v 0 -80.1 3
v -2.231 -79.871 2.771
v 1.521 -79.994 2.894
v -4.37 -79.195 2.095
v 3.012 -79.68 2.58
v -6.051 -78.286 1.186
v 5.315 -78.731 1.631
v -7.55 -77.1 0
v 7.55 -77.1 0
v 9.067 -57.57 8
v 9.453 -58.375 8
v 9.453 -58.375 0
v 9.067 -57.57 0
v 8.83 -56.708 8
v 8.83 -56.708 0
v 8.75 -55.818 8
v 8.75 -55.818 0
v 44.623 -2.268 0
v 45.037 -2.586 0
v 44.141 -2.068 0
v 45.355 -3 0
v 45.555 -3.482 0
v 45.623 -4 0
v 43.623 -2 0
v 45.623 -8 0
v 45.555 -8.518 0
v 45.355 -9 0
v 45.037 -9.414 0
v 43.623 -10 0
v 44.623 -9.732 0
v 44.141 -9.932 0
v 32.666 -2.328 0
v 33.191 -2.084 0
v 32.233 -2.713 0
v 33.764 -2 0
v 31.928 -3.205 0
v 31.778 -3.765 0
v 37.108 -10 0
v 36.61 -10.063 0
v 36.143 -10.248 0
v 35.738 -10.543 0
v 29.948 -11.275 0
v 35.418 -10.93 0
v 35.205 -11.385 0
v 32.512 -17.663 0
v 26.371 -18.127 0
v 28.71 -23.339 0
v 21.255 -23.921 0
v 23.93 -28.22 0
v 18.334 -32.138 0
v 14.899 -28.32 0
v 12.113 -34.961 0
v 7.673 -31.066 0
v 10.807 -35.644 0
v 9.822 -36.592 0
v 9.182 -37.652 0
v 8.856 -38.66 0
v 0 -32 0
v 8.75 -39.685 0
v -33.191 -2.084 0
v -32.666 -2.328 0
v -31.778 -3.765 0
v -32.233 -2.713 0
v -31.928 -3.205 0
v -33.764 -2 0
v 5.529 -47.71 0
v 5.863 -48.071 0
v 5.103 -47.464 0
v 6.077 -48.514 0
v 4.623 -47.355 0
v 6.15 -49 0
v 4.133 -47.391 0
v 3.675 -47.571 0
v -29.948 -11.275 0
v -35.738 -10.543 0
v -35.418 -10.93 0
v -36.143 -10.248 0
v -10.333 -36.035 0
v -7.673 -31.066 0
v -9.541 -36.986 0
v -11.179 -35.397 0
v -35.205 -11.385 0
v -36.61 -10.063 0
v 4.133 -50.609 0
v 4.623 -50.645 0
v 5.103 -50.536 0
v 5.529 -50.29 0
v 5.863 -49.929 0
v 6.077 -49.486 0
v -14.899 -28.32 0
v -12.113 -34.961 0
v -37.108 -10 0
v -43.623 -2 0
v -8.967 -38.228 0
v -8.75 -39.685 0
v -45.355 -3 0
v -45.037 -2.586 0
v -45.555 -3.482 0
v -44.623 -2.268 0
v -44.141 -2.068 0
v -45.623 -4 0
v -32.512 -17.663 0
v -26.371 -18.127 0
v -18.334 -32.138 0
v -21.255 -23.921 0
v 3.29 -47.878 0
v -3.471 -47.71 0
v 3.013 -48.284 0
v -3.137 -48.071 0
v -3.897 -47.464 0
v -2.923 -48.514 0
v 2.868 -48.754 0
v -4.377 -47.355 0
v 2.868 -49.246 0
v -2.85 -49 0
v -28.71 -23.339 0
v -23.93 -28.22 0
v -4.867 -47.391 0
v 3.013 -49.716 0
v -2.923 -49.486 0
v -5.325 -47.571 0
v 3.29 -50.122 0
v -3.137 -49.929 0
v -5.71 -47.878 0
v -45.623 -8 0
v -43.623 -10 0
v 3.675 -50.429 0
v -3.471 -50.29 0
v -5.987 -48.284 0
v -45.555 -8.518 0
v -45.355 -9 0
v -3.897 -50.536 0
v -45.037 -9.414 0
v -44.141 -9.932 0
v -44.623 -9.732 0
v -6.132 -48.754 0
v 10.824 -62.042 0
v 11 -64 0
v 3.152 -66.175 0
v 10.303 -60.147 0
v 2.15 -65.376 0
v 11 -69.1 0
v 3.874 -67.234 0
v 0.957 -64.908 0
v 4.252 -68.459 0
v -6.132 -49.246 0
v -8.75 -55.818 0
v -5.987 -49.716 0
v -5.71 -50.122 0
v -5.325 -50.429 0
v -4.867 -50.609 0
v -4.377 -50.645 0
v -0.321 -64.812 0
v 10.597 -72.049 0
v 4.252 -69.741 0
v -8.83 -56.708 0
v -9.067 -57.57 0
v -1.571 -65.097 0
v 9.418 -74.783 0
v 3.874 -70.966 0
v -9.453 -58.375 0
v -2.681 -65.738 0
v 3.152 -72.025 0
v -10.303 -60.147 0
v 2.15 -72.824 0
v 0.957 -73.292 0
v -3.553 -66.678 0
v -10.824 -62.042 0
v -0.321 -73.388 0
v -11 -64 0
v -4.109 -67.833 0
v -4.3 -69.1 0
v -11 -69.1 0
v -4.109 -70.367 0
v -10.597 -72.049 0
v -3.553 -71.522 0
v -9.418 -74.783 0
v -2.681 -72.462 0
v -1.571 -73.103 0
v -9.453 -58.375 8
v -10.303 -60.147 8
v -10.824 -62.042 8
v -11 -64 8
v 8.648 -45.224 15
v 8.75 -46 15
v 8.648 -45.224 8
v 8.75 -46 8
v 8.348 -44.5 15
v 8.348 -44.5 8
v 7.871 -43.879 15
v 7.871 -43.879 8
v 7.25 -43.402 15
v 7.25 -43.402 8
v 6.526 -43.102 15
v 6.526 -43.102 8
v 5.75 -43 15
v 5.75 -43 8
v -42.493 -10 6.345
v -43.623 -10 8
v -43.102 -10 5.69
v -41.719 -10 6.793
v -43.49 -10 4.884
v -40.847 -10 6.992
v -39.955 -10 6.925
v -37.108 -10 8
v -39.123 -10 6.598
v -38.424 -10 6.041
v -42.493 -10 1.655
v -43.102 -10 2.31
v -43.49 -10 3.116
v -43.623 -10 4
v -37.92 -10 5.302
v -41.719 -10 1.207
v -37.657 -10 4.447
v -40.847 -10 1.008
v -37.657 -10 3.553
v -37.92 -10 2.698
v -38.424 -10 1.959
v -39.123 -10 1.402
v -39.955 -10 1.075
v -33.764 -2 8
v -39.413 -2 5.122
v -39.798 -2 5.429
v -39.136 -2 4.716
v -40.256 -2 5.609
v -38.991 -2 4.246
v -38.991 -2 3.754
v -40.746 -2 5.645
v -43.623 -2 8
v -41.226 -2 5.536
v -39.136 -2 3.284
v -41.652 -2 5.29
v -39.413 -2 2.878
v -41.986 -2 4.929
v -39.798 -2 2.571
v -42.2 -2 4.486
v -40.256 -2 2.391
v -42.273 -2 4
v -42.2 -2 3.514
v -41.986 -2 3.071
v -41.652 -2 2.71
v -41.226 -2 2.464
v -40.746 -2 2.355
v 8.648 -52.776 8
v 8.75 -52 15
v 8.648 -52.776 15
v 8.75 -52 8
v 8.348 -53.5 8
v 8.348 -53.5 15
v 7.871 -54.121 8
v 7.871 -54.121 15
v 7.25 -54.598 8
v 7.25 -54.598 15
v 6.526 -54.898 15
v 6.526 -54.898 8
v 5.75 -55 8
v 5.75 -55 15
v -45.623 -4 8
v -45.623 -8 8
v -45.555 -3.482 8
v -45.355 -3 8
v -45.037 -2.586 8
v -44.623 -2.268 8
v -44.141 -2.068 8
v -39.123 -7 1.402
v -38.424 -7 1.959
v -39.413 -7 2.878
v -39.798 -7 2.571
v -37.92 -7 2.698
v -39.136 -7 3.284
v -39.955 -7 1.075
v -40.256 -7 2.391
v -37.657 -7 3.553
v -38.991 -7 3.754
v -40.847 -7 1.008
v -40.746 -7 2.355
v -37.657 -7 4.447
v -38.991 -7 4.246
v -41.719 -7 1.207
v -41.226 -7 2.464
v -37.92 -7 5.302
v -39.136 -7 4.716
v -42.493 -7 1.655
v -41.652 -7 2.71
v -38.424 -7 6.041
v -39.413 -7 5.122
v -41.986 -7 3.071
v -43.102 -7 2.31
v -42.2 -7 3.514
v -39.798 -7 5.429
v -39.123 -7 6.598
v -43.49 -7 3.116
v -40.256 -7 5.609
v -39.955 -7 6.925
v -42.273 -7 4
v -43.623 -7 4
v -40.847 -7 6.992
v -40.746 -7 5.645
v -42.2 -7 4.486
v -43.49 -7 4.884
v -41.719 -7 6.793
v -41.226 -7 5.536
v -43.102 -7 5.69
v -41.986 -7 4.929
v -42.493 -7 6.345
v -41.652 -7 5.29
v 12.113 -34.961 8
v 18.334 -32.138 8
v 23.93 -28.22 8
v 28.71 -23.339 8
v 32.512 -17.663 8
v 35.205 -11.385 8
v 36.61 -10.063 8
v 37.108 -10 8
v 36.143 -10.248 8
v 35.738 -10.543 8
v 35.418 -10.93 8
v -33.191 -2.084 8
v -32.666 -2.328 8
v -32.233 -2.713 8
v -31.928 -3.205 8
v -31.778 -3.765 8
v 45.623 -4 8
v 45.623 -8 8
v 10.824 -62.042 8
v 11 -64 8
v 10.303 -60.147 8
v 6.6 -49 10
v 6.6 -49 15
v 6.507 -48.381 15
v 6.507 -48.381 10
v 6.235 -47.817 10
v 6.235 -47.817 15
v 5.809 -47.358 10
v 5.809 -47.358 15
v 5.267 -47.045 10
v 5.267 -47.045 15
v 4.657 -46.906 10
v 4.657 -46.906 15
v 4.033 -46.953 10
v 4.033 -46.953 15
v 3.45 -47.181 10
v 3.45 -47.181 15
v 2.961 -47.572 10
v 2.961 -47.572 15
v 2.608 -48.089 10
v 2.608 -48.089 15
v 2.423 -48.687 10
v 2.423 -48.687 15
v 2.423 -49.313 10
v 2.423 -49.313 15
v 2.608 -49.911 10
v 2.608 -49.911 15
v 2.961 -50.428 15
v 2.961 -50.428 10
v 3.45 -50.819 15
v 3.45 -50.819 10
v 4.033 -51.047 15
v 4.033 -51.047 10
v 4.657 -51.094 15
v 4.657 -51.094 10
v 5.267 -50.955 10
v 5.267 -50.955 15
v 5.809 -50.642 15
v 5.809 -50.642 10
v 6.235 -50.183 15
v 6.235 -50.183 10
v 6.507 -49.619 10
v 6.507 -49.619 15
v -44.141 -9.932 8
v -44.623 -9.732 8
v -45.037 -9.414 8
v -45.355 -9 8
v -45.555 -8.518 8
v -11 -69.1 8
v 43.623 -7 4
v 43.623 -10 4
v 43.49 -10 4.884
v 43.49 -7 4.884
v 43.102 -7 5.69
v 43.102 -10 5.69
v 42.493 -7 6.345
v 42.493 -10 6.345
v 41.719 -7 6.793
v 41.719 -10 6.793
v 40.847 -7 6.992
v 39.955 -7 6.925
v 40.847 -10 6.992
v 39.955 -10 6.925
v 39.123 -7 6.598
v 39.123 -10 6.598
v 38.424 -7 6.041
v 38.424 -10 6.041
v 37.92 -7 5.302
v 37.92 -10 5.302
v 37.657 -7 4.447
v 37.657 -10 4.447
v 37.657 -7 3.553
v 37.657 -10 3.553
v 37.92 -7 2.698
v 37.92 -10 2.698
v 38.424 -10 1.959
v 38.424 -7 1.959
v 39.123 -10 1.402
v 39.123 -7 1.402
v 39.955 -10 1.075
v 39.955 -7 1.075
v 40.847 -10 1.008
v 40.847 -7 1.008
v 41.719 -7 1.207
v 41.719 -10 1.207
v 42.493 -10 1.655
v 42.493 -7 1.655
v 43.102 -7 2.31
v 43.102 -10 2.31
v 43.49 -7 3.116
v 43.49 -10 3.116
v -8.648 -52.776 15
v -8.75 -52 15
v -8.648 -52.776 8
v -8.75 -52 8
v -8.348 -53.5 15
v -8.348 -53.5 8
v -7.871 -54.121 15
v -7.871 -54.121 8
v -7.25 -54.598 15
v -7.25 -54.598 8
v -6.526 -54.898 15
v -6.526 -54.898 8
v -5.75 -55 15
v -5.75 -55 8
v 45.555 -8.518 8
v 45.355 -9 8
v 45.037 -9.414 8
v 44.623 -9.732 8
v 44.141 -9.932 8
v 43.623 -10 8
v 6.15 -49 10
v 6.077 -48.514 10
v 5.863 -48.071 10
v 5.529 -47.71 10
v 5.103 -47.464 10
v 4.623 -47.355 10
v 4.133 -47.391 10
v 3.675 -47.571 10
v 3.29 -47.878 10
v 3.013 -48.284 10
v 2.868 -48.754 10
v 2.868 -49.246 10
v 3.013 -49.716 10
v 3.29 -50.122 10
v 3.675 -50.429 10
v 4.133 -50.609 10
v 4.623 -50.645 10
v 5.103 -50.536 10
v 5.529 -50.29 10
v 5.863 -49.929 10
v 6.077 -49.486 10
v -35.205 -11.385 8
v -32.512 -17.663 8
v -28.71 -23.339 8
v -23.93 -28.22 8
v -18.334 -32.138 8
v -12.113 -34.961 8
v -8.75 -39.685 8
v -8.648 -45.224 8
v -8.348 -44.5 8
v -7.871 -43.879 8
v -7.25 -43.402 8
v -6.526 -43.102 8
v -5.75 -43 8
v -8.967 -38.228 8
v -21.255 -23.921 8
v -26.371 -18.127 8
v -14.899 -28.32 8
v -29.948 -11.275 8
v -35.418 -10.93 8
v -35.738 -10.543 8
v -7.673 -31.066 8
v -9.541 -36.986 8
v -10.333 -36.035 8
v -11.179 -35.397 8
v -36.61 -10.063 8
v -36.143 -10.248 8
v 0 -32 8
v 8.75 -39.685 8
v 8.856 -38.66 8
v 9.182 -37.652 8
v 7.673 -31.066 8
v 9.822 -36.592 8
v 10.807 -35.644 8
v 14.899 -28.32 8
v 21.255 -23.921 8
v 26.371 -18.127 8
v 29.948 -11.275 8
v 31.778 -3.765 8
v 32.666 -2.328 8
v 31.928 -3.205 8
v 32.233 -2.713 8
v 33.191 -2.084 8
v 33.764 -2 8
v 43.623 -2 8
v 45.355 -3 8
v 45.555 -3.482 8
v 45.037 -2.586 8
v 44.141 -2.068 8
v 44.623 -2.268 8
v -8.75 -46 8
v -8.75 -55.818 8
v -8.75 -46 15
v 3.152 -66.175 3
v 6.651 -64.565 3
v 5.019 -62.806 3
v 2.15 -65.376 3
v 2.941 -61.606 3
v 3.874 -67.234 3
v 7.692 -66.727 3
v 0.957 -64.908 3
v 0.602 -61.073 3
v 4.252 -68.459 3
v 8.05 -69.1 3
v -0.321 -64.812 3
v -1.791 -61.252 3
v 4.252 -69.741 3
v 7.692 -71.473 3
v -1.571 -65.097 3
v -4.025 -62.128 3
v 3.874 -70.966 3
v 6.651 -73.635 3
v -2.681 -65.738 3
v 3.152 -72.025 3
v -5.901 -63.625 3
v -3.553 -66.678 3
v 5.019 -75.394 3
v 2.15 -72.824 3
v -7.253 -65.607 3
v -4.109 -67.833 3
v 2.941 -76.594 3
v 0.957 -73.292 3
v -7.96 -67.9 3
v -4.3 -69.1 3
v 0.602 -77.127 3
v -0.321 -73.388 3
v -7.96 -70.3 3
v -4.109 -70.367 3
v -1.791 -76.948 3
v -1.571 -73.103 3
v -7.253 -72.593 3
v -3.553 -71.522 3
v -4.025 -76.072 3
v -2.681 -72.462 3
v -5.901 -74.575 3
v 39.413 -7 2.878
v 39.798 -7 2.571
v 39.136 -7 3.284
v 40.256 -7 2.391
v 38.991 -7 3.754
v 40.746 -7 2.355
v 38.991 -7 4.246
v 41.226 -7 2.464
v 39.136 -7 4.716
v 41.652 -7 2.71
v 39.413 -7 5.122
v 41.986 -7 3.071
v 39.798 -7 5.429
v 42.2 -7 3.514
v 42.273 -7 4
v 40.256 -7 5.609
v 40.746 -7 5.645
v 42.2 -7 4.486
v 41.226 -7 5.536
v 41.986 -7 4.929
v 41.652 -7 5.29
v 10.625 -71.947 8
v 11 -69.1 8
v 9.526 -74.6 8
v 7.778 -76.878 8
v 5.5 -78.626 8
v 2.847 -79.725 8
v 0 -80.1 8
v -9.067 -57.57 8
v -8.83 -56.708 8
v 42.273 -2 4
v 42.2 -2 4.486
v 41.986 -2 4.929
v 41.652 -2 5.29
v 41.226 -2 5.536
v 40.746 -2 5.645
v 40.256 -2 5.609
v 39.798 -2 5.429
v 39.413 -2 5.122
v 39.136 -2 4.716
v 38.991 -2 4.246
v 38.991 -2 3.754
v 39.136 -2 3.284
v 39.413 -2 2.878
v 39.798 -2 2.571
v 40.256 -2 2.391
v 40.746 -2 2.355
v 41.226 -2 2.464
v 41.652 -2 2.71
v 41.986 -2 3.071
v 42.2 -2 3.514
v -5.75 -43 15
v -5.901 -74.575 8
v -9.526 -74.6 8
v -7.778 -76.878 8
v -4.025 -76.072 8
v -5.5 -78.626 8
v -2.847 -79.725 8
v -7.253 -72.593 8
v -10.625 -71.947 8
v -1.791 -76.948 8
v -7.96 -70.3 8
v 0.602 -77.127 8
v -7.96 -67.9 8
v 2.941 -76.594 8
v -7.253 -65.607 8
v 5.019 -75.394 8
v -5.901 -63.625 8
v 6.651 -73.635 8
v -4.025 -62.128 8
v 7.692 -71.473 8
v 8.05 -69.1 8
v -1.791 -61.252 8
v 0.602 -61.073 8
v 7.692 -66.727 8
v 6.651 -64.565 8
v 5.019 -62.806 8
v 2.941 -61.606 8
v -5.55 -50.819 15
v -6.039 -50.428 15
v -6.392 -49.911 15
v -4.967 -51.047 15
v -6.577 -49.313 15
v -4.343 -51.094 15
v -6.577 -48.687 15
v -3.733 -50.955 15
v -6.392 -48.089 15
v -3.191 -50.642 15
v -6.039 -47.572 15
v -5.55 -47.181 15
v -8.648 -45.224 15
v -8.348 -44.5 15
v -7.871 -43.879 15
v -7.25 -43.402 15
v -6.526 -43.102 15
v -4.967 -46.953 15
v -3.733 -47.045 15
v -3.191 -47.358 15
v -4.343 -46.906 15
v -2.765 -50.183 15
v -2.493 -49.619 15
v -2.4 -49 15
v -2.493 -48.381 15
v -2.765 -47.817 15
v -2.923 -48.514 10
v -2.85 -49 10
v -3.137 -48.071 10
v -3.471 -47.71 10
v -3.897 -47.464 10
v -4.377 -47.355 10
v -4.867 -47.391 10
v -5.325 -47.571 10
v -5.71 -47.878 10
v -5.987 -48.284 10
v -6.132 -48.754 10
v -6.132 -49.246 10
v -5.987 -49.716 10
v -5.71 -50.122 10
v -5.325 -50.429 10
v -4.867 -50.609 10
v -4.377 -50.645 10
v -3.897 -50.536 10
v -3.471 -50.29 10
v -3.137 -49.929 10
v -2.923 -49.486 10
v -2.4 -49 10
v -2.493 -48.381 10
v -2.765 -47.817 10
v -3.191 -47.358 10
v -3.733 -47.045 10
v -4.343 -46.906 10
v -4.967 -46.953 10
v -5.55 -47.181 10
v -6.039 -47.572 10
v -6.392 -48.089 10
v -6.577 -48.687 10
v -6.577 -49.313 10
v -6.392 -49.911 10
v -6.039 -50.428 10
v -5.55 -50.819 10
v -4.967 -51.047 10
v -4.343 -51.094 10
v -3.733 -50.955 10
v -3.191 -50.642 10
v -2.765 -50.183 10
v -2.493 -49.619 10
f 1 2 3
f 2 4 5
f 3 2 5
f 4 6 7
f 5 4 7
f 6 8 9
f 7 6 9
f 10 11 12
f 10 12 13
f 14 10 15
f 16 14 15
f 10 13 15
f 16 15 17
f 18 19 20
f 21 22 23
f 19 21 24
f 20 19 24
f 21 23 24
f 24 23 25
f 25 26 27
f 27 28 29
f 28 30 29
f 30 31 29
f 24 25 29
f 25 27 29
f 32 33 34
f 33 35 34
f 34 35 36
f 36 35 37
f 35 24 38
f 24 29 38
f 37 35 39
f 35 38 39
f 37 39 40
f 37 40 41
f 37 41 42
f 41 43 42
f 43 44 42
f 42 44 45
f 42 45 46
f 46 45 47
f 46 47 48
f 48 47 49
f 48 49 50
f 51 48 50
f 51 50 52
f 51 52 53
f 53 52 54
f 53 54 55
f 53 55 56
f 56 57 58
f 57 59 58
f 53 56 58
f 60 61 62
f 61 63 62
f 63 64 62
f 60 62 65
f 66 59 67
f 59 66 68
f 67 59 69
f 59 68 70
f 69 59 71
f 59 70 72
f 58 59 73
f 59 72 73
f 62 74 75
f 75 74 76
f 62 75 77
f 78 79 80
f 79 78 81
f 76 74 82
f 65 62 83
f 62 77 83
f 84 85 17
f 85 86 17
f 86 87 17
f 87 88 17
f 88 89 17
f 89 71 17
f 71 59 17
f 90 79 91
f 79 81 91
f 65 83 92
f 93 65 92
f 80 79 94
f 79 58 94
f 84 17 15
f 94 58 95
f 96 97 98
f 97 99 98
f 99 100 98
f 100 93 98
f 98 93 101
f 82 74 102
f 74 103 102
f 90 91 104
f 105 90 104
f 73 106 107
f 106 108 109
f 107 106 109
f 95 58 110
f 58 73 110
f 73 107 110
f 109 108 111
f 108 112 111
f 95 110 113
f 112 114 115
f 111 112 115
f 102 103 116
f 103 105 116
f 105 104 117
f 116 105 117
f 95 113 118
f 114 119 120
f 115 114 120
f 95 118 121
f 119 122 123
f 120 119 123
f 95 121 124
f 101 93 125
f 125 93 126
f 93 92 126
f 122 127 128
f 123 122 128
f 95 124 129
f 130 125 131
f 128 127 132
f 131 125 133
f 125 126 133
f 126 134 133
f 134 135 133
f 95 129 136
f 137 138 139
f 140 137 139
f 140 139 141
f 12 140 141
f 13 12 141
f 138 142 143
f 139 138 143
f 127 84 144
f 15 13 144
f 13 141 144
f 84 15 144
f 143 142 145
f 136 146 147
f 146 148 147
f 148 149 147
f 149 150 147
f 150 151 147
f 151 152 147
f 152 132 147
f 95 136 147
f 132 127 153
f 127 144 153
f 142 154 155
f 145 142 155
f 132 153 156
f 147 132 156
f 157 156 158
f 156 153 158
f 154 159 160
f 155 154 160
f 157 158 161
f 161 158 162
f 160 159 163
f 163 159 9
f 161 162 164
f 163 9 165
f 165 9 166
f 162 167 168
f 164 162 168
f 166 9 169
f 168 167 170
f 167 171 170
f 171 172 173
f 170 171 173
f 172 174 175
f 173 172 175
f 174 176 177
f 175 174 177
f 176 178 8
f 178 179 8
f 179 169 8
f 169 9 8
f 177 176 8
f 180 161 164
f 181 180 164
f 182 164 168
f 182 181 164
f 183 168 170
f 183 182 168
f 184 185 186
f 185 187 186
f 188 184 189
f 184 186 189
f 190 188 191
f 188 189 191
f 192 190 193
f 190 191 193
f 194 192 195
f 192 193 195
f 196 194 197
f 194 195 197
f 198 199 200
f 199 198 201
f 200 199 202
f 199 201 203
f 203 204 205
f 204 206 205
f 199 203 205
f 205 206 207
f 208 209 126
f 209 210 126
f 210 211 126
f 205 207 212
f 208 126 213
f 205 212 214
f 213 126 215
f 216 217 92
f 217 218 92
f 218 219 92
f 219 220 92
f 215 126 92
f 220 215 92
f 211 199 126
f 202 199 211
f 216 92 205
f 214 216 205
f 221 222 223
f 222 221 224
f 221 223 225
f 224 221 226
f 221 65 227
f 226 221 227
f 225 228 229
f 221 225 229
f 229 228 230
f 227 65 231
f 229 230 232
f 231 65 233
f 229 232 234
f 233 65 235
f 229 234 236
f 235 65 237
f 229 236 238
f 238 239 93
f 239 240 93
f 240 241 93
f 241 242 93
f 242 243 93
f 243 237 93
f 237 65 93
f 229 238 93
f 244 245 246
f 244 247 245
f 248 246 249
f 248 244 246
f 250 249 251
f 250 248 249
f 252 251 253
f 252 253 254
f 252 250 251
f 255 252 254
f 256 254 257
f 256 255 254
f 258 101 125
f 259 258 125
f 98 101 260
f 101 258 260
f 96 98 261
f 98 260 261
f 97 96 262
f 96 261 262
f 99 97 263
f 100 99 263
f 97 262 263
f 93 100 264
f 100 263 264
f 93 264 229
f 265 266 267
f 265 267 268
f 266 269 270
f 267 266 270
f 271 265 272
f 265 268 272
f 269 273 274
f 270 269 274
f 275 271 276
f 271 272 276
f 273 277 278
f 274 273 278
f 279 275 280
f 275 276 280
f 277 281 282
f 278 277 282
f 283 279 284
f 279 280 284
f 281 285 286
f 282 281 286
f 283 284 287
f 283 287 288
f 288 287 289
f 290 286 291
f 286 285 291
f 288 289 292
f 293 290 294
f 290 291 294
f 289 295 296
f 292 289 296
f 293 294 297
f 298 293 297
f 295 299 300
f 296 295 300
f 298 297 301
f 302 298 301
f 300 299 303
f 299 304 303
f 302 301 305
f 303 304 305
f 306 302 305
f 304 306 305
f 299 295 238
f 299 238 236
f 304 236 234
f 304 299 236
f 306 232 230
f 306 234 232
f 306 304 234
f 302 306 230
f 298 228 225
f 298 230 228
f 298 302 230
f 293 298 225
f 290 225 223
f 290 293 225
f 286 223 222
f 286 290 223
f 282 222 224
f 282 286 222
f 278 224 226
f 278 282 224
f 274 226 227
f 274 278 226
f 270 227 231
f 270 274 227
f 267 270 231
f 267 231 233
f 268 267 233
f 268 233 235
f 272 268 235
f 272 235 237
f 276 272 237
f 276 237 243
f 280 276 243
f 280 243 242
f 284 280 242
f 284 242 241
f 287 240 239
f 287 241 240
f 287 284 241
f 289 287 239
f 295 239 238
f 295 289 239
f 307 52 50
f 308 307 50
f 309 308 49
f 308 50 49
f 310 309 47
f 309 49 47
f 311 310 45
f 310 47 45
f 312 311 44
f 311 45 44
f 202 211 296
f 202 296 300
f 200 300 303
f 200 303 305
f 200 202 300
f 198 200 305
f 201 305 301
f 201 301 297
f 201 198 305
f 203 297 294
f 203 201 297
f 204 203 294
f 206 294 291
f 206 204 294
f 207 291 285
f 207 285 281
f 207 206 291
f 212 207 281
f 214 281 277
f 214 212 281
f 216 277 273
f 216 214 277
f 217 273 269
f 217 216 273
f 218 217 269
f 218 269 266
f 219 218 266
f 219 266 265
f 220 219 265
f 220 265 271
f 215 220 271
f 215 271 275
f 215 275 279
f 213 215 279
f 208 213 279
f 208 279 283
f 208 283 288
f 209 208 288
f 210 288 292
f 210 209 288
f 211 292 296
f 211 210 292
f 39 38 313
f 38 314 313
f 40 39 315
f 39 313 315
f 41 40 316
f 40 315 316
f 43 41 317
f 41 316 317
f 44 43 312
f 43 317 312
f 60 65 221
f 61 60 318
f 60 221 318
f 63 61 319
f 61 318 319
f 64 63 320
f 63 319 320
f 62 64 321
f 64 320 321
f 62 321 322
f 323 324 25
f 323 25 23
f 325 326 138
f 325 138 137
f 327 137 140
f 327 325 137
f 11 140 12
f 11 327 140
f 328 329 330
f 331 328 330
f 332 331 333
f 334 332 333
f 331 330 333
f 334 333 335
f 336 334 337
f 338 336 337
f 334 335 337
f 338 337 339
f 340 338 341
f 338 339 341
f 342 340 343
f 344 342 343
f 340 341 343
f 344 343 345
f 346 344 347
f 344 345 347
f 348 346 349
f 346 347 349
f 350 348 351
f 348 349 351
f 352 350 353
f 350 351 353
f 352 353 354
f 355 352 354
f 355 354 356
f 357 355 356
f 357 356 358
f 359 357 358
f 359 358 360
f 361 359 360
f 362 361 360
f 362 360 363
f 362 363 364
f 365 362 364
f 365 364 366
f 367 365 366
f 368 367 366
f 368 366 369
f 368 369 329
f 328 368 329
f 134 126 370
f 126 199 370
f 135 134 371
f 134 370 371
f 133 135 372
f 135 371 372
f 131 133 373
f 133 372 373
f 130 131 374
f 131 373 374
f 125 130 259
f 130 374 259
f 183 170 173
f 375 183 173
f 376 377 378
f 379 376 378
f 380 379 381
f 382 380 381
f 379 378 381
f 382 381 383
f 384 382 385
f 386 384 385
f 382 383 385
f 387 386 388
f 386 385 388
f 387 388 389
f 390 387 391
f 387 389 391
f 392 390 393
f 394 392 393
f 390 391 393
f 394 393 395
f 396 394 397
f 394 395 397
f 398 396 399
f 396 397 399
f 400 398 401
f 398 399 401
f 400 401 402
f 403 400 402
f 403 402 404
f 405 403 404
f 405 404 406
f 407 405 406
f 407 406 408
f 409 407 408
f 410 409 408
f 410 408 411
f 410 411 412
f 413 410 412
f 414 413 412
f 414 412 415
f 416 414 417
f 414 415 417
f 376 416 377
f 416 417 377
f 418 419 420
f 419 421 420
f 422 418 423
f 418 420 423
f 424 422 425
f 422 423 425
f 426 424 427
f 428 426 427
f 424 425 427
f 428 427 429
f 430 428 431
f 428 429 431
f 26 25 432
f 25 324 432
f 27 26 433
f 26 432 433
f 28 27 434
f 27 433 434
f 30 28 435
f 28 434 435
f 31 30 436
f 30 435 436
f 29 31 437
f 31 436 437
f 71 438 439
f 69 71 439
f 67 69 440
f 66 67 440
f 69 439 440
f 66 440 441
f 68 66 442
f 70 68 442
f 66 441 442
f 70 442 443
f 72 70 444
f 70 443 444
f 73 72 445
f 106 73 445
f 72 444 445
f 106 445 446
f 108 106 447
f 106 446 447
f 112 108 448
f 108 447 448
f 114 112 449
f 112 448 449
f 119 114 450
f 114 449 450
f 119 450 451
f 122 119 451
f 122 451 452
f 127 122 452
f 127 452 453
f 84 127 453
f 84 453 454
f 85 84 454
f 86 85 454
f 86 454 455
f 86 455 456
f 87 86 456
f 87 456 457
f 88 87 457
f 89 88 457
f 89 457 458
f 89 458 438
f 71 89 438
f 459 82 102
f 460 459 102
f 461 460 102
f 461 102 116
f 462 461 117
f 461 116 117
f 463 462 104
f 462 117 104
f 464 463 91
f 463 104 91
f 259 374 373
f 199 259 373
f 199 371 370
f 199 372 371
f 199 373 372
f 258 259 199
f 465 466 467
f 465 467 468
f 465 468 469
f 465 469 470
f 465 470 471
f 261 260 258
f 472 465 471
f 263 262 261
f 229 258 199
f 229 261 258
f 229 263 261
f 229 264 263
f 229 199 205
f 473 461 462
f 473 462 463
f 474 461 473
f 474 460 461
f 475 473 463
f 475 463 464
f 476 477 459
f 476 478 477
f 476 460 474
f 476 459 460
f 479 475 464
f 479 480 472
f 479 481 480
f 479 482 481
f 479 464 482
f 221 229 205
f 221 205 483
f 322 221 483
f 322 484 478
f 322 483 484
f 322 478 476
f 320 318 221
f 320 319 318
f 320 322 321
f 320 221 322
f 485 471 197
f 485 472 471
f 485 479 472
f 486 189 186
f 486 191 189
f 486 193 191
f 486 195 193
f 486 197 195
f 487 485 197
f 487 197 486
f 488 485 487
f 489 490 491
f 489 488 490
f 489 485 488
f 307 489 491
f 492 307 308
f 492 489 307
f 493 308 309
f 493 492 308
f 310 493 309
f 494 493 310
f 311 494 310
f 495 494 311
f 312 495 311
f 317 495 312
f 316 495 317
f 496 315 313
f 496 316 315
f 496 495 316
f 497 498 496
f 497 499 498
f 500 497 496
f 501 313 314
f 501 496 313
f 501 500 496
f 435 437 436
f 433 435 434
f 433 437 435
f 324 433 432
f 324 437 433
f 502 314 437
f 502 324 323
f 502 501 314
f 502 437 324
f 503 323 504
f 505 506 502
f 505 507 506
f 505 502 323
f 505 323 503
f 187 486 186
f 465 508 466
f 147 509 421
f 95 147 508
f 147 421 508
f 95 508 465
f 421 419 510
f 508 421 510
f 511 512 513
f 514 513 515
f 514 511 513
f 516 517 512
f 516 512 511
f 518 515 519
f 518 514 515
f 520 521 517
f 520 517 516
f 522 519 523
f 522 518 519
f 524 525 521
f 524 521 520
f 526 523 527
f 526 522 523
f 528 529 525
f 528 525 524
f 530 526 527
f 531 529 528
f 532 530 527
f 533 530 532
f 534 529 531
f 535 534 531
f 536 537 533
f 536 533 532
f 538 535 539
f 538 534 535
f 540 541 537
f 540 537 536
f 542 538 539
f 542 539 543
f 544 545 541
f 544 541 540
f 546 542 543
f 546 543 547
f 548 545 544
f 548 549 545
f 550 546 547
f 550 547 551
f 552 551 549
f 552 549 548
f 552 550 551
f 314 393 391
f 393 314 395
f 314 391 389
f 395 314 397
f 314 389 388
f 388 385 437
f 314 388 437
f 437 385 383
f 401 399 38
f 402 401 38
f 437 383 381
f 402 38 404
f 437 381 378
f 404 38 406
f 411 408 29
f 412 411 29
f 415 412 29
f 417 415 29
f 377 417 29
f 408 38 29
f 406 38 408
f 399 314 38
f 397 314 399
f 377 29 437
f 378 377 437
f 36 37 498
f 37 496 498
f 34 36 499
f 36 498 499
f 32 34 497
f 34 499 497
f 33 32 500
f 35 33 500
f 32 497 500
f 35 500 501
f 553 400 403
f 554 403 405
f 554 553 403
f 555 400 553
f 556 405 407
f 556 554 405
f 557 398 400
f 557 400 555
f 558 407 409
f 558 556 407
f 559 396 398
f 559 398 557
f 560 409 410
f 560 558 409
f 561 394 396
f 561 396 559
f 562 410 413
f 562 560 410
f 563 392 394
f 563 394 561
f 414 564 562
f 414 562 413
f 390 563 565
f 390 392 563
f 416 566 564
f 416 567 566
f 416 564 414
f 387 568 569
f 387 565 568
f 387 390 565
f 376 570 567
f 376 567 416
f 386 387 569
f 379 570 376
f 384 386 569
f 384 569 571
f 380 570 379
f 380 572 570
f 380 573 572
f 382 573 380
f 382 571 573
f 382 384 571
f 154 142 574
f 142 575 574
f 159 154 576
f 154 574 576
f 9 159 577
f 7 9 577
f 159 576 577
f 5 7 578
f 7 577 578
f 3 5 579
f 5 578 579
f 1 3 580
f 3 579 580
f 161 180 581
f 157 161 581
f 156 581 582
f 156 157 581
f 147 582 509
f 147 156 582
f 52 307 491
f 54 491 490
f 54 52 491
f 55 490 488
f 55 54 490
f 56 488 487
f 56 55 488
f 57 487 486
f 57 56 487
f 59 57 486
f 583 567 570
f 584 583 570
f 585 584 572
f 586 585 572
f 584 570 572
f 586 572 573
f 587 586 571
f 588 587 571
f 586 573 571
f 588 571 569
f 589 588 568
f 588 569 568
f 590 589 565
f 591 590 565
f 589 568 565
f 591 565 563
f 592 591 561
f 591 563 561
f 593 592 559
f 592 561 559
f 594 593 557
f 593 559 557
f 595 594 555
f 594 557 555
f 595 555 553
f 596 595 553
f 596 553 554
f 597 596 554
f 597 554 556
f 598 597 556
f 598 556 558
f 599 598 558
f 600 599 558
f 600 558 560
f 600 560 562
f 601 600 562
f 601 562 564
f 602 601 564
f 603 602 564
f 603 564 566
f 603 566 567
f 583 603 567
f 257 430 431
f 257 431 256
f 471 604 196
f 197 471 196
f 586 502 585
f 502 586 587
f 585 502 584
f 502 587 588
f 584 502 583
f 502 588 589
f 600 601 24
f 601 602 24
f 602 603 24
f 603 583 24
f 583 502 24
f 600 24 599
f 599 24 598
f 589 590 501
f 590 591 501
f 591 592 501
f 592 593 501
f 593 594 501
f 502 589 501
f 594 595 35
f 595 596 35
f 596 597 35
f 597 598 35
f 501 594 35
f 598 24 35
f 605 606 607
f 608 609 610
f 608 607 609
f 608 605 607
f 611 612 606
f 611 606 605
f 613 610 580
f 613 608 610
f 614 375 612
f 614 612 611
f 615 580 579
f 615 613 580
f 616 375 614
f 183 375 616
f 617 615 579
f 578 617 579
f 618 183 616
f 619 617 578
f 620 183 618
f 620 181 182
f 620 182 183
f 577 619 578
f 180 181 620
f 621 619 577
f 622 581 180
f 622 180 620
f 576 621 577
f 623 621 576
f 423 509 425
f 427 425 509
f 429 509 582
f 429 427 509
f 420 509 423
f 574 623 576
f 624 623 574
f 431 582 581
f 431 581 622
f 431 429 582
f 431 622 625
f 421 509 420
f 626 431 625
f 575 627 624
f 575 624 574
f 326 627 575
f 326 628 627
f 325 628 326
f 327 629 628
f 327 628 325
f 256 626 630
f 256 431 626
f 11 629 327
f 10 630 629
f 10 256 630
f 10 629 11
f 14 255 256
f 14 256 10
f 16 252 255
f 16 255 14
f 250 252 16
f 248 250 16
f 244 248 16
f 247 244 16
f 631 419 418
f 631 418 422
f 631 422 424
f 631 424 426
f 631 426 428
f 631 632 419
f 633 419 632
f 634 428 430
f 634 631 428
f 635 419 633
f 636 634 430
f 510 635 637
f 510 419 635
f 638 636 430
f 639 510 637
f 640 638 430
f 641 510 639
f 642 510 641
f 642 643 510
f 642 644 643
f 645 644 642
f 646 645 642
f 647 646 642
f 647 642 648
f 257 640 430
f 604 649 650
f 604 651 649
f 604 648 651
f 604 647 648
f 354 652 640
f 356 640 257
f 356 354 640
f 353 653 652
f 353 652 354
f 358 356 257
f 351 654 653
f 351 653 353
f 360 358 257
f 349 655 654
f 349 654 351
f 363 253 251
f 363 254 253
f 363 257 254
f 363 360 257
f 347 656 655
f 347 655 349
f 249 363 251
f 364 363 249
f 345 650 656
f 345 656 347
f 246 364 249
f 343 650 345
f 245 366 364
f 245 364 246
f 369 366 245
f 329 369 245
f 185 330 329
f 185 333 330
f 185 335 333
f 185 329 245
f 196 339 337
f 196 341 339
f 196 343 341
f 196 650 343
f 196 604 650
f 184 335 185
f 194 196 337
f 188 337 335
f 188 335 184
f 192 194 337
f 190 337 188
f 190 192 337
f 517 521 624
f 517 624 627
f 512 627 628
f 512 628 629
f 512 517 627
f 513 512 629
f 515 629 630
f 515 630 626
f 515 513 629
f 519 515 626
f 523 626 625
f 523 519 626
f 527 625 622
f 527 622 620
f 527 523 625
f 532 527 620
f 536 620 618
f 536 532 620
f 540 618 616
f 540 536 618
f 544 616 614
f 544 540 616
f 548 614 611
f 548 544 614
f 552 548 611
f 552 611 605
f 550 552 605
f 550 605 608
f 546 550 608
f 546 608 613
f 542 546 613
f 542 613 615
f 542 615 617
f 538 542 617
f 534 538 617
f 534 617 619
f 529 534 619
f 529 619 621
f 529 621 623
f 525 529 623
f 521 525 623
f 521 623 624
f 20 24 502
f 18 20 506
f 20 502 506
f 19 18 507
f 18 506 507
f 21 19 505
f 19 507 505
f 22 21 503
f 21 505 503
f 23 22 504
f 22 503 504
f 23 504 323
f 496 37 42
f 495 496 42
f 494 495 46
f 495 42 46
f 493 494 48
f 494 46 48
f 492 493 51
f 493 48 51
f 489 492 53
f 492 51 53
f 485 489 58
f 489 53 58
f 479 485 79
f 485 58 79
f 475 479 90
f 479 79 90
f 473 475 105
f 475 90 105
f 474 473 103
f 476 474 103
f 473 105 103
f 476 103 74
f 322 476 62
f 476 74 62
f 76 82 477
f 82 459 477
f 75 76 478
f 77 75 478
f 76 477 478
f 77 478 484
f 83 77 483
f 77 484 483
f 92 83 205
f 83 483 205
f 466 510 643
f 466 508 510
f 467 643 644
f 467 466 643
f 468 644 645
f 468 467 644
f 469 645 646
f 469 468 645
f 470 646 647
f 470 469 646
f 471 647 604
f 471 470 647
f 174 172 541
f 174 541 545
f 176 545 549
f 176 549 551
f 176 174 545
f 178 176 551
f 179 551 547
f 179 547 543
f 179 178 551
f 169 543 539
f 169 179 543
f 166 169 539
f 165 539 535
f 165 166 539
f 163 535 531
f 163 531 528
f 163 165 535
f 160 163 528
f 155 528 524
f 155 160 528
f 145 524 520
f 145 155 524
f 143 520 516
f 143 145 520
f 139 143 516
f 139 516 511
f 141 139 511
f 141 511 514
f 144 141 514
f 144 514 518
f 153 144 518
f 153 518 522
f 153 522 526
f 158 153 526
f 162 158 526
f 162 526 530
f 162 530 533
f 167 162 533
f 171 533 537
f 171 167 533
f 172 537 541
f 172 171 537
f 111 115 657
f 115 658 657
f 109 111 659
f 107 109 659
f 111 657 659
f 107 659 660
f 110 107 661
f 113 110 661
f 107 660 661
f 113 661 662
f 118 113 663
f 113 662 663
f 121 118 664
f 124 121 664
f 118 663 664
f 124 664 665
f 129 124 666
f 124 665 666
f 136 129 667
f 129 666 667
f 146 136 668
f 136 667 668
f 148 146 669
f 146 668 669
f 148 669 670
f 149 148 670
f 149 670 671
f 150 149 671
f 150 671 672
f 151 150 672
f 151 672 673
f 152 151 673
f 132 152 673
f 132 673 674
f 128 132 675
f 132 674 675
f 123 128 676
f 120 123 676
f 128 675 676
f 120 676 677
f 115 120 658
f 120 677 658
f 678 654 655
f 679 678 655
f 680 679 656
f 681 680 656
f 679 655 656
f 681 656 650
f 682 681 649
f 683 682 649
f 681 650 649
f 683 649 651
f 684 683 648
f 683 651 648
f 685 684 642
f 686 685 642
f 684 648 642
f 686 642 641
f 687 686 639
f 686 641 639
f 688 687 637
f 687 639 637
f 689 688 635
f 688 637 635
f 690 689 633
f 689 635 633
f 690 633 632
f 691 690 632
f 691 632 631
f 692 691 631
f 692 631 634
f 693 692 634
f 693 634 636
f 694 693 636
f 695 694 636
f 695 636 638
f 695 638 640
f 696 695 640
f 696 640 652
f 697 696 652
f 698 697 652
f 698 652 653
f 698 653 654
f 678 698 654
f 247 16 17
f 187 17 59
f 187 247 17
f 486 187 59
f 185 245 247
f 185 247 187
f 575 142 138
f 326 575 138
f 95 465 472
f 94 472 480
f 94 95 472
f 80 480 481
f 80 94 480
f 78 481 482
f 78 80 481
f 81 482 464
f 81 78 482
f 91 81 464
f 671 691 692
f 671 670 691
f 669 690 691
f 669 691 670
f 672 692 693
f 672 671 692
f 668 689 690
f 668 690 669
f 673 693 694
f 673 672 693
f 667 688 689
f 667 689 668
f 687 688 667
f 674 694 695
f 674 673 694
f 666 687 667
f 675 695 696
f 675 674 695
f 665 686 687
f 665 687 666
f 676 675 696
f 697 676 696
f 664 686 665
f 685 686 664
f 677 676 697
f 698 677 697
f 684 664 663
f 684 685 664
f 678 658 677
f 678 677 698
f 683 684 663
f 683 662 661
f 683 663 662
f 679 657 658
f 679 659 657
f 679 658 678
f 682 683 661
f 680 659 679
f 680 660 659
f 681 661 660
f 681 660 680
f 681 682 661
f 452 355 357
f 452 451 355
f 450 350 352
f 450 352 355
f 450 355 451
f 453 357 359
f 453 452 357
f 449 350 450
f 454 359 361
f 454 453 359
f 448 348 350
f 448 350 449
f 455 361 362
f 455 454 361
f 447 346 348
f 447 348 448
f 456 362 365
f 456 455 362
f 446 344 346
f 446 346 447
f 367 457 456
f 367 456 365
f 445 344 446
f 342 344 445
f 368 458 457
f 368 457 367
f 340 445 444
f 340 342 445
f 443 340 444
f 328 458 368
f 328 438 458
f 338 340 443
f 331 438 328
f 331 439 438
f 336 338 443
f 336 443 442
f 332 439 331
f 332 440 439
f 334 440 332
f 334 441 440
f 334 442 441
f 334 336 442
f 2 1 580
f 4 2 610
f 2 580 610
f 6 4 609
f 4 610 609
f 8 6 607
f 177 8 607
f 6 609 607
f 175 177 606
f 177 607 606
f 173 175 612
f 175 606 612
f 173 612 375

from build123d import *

# Parameters (mm, degrees)
SKETCH3_R           = 8.05
BOSS_EXTRUDE1_DEPTH = 8
SKETCH4_R           = 8.05
SKETCH4_R_2         = 4.3
BOSS_EXTRUDE2_DEPTH = 3
CHAMFER1_SIZE       = 3
FILLET1_R           = 11
SKETCH5_R           = 1.65
CUT_EXTRUDE1_DEPTH  = 85.020655349
SKETCH6_R           = 3
CUT_EXTRUDE2_DEPTH  = 3
SKETCH7_R           = 2.1
CUT_EXTRUDE3_DEPTH  = 5
SKETCH8_R           = 1.65
CUT_EXTRUDE4_DEPTH  = 93.528214752
CUT_EXTRUDE5_DEPTH  = 93.528214752
FILLET2_R           = 5
FILLET3_R           = 2
BOSS_EXTRUDE3_START = 7
SKETCH10_W          = 17.5
SKETCH10_H          = 12
SKETCH10_R          = 2.1
BOSS_EXTRUDE3_DEPTH = 7
FILLET4_R           = 3
BOSS_EXTRUDE4_START = 7
SKETCH11_R          = 2.1
SKETCH11_R_2        = 1.65
BOSS_EXTRUDE4_DEPTH = 7


with BuildPart() as part:
    # Sketch3 → Boss-Extrude1 (new body)
    with BuildSketch(Plane.XY):
        with BuildLine():
            Line((-31.937438845, -2), (-45.623026261, -2))
            Line((-45.623026261, -2), (-45.623026261, -10))
            Line((-45.623026261, -10), (-35.623026261, -10))
            ThreePointArc((-35.623026261, -10), (-26.529067588, -25.791637654), (-11, -35.327043465))
            Line((-11, -35.327043465), (-11, -80.1))
            Line((-11, -80.1), (11, -80.1))
            Line((11, -80.1), (11, -35.327043465))
            ThreePointArc((11, -35.327043465), (26.529067588, -25.791637654), (35.623026261, -10))
            Line((35.623026261, -10), (45.623026261, -10))
            Line((45.623026261, -10), (45.623026261, -2))
            Line((45.623026261, -2), (31.937438845, -2))
            ThreePointArc((31.937438845, -2), (0, -32), (-31.937438845, -2))
        make_face()
        with Locations((0, -69.1)):
            Circle(SKETCH3_R, mode=Mode.SUBTRACT)
    extrude(amount=BOSS_EXTRUDE1_DEPTH)

    # Sketch4 → Boss-Extrude2 (add)
    with BuildSketch(Plane.XY):
        with Locations(Location((0, -69.1, 0), (0, 0, 180))):
            Circle(SKETCH4_R)
        with Locations(Location((0, -69.1, 0), (0, 0, 180))):
            Circle(SKETCH4_R_2, mode=Mode.SUBTRACT)
    extrude(amount=BOSS_EXTRUDE2_DEPTH)

    # Chamfer1
    chamfer1_edges = [part.edges().sort_by_distance(p)[0] for p in [
        (0, -80.1, 0),
    ]]
    chamfer(chamfer1_edges, length=CHAMFER1_SIZE)

    # Fillet1
    fillet1_edges = [part.edges().sort_by_distance(p)[0] for p in [
        (-11, -80.1, 5.5),
        (11, -80.1, 5.5),
    ]]
    fillet(fillet1_edges, radius=FILLET1_R - 0.0001)  # a hair under: the kernel refuses the full size

    # Sketch5 → Cut-Extrude1 (cut, through all)
    with BuildSketch(Plane.XZ.offset(10)):
        with Locations((40.623026261, 4)):
            Circle(SKETCH5_R)
    cut_extrude1 = extrude(amount=-CUT_EXTRUDE1_DEPTH, mode=Mode.SUBTRACT)

    # Sketch6 → Cut-Extrude2 (cut)
    with BuildSketch(Plane.XZ.offset(10)):
        with Locations((40.623026261, 4)):
            Circle(SKETCH6_R)
    cut_extrude2 = extrude(amount=-CUT_EXTRUDE2_DEPTH, mode=Mode.SUBTRACT)

    # Mirror1: Cut-Extrude1, Cut-Extrude2 across plane
    add(cut_extrude1.mirror(Plane(origin=(0, 0, 0), x_dir=(0, 0, 1), z_dir=(1, 0, 0))), mode=Mode.SUBTRACT)
    add(cut_extrude2.mirror(Plane(origin=(0, 0, 0), x_dir=(0, 0, 1), z_dir=(1, 0, 0))), mode=Mode.SUBTRACT)

    # Sketch7 → Cut-Extrude3 (cut)
    with BuildSketch(Plane.XY.offset(8)):
        with Locations((-4.5, -49)):
            Circle(SKETCH7_R)
        with Locations((4.5, -49)):
            Circle(SKETCH7_R)
    extrude(amount=-CUT_EXTRUDE3_DEPTH, mode=Mode.SUBTRACT)

    # Sketch8 → Cut-Extrude4 (cut, through all)
    with BuildSketch(Plane.XY.offset(8)):
        with Locations((4.5, -49)):
            Circle(SKETCH8_R)
        with Locations((-4.5, -49)):
            Circle(SKETCH8_R)
    extrude(amount=-CUT_EXTRUDE4_DEPTH, mode=Mode.SUBTRACT)

    # Sketch9 → Cut-Extrude5 (cut, through all)
    with BuildSketch(Plane.XY.offset(8)):
        with BuildLine():
            Line((-8.75, -35.950486784), (-8.75, -57.333854187))
            ThreePointArc((-8.75, -57.333854187), (-10.422331793, -60.48218818), (-11, -64))
            Line((-11, -64), (-11, -35.327043465))
            ThreePointArc((-11, -35.327043465), (-9.879918795, -35.656517001), (-8.75, -35.950486784))
        make_face()
        with BuildLine():
            Line((8.75, -57.333854187), (8.75, -35.950486784))
            ThreePointArc((8.75, -35.950486784), (9.879918795, -35.656517001), (11, -35.327043465))
            Line((11, -35.327043465), (11, -64))
            ThreePointArc((11, -64), (10.422331793, -60.48218818), (8.75, -57.333854187))
        make_face()
    extrude(amount=-CUT_EXTRUDE5_DEPTH, mode=Mode.SUBTRACT)

    # Fillet2
    fillet2_edges = [part.edges().sort_by_distance(p)[0] for p in [
        (-8.75, -35.950486784, 4),
        (-8.75, -57.333854187, 4),
        (8.75, -57.333854187, 4),
        (8.75, -35.950486784, 4),
    ]]
    fillet(fillet2_edges, radius=FILLET2_R)

    # Fillet3
    fillet3_edges = [part.edges().sort_by_distance(p)[0] for p in [
        (-45.623026261, -2, 4),
        (-31.937438845, -2, 4),
        (31.937438845, -2, 4),
        (45.623026261, -2, 4),
        (45.623026261, -10, 4),
        (35.623026261, -10, 4),
        (-35.623026261, -10, 4),
        (-45.623026261, -10, 4),
    ]]
    fillet(fillet3_edges, radius=FILLET3_R - 0.0001)  # a hair under: the kernel refuses the full size

    # Sketch10 → Boss-Extrude3 (add)
    with BuildSketch(Plane.XY.offset(8).offset(BOSS_EXTRUDE3_START)):
        with Locations((0, -49)):
            Rectangle(SKETCH10_W, SKETCH10_H)
        with Locations((4.5, -49)):
            Circle(SKETCH10_R, mode=Mode.SUBTRACT)
        with Locations((-4.5, -49)):
            Circle(SKETCH10_R, mode=Mode.SUBTRACT)
    extrude(amount=-BOSS_EXTRUDE3_DEPTH)

    # Fillet4
    fillet4_edges = [part.edges().sort_by_distance(p)[0] for p in [
        (-8.75, -43, 11.5),
        (-8.75, -55, 11.5),
        (8.75, -55, 11.5),
        (8.75, -43, 11.5),
    ]]
    fillet(fillet4_edges, radius=FILLET4_R)

    # Sketch11 → Boss-Extrude4 (add)
    # profile 1 of 2: a face of its own
    with BuildSketch(Plane.XY.offset(3).offset(BOSS_EXTRUDE4_START)):
        with Locations((4.5, -49)):
            Circle(SKETCH11_R)
        with Locations((4.5, -49)):
            Circle(SKETCH11_R_2, mode=Mode.SUBTRACT)
    # profile 2 of 2: a face of its own
    with BuildSketch(Plane.XY.offset(3).offset(BOSS_EXTRUDE4_START)):
        with Locations((-4.5, -49)):
            Circle(SKETCH11_R)
        with Locations((-4.5, -49)):
            Circle(SKETCH11_R_2, mode=Mode.SUBTRACT)
    extrude(amount=-BOSS_EXTRUDE4_DEPTH)


solid = part.part
